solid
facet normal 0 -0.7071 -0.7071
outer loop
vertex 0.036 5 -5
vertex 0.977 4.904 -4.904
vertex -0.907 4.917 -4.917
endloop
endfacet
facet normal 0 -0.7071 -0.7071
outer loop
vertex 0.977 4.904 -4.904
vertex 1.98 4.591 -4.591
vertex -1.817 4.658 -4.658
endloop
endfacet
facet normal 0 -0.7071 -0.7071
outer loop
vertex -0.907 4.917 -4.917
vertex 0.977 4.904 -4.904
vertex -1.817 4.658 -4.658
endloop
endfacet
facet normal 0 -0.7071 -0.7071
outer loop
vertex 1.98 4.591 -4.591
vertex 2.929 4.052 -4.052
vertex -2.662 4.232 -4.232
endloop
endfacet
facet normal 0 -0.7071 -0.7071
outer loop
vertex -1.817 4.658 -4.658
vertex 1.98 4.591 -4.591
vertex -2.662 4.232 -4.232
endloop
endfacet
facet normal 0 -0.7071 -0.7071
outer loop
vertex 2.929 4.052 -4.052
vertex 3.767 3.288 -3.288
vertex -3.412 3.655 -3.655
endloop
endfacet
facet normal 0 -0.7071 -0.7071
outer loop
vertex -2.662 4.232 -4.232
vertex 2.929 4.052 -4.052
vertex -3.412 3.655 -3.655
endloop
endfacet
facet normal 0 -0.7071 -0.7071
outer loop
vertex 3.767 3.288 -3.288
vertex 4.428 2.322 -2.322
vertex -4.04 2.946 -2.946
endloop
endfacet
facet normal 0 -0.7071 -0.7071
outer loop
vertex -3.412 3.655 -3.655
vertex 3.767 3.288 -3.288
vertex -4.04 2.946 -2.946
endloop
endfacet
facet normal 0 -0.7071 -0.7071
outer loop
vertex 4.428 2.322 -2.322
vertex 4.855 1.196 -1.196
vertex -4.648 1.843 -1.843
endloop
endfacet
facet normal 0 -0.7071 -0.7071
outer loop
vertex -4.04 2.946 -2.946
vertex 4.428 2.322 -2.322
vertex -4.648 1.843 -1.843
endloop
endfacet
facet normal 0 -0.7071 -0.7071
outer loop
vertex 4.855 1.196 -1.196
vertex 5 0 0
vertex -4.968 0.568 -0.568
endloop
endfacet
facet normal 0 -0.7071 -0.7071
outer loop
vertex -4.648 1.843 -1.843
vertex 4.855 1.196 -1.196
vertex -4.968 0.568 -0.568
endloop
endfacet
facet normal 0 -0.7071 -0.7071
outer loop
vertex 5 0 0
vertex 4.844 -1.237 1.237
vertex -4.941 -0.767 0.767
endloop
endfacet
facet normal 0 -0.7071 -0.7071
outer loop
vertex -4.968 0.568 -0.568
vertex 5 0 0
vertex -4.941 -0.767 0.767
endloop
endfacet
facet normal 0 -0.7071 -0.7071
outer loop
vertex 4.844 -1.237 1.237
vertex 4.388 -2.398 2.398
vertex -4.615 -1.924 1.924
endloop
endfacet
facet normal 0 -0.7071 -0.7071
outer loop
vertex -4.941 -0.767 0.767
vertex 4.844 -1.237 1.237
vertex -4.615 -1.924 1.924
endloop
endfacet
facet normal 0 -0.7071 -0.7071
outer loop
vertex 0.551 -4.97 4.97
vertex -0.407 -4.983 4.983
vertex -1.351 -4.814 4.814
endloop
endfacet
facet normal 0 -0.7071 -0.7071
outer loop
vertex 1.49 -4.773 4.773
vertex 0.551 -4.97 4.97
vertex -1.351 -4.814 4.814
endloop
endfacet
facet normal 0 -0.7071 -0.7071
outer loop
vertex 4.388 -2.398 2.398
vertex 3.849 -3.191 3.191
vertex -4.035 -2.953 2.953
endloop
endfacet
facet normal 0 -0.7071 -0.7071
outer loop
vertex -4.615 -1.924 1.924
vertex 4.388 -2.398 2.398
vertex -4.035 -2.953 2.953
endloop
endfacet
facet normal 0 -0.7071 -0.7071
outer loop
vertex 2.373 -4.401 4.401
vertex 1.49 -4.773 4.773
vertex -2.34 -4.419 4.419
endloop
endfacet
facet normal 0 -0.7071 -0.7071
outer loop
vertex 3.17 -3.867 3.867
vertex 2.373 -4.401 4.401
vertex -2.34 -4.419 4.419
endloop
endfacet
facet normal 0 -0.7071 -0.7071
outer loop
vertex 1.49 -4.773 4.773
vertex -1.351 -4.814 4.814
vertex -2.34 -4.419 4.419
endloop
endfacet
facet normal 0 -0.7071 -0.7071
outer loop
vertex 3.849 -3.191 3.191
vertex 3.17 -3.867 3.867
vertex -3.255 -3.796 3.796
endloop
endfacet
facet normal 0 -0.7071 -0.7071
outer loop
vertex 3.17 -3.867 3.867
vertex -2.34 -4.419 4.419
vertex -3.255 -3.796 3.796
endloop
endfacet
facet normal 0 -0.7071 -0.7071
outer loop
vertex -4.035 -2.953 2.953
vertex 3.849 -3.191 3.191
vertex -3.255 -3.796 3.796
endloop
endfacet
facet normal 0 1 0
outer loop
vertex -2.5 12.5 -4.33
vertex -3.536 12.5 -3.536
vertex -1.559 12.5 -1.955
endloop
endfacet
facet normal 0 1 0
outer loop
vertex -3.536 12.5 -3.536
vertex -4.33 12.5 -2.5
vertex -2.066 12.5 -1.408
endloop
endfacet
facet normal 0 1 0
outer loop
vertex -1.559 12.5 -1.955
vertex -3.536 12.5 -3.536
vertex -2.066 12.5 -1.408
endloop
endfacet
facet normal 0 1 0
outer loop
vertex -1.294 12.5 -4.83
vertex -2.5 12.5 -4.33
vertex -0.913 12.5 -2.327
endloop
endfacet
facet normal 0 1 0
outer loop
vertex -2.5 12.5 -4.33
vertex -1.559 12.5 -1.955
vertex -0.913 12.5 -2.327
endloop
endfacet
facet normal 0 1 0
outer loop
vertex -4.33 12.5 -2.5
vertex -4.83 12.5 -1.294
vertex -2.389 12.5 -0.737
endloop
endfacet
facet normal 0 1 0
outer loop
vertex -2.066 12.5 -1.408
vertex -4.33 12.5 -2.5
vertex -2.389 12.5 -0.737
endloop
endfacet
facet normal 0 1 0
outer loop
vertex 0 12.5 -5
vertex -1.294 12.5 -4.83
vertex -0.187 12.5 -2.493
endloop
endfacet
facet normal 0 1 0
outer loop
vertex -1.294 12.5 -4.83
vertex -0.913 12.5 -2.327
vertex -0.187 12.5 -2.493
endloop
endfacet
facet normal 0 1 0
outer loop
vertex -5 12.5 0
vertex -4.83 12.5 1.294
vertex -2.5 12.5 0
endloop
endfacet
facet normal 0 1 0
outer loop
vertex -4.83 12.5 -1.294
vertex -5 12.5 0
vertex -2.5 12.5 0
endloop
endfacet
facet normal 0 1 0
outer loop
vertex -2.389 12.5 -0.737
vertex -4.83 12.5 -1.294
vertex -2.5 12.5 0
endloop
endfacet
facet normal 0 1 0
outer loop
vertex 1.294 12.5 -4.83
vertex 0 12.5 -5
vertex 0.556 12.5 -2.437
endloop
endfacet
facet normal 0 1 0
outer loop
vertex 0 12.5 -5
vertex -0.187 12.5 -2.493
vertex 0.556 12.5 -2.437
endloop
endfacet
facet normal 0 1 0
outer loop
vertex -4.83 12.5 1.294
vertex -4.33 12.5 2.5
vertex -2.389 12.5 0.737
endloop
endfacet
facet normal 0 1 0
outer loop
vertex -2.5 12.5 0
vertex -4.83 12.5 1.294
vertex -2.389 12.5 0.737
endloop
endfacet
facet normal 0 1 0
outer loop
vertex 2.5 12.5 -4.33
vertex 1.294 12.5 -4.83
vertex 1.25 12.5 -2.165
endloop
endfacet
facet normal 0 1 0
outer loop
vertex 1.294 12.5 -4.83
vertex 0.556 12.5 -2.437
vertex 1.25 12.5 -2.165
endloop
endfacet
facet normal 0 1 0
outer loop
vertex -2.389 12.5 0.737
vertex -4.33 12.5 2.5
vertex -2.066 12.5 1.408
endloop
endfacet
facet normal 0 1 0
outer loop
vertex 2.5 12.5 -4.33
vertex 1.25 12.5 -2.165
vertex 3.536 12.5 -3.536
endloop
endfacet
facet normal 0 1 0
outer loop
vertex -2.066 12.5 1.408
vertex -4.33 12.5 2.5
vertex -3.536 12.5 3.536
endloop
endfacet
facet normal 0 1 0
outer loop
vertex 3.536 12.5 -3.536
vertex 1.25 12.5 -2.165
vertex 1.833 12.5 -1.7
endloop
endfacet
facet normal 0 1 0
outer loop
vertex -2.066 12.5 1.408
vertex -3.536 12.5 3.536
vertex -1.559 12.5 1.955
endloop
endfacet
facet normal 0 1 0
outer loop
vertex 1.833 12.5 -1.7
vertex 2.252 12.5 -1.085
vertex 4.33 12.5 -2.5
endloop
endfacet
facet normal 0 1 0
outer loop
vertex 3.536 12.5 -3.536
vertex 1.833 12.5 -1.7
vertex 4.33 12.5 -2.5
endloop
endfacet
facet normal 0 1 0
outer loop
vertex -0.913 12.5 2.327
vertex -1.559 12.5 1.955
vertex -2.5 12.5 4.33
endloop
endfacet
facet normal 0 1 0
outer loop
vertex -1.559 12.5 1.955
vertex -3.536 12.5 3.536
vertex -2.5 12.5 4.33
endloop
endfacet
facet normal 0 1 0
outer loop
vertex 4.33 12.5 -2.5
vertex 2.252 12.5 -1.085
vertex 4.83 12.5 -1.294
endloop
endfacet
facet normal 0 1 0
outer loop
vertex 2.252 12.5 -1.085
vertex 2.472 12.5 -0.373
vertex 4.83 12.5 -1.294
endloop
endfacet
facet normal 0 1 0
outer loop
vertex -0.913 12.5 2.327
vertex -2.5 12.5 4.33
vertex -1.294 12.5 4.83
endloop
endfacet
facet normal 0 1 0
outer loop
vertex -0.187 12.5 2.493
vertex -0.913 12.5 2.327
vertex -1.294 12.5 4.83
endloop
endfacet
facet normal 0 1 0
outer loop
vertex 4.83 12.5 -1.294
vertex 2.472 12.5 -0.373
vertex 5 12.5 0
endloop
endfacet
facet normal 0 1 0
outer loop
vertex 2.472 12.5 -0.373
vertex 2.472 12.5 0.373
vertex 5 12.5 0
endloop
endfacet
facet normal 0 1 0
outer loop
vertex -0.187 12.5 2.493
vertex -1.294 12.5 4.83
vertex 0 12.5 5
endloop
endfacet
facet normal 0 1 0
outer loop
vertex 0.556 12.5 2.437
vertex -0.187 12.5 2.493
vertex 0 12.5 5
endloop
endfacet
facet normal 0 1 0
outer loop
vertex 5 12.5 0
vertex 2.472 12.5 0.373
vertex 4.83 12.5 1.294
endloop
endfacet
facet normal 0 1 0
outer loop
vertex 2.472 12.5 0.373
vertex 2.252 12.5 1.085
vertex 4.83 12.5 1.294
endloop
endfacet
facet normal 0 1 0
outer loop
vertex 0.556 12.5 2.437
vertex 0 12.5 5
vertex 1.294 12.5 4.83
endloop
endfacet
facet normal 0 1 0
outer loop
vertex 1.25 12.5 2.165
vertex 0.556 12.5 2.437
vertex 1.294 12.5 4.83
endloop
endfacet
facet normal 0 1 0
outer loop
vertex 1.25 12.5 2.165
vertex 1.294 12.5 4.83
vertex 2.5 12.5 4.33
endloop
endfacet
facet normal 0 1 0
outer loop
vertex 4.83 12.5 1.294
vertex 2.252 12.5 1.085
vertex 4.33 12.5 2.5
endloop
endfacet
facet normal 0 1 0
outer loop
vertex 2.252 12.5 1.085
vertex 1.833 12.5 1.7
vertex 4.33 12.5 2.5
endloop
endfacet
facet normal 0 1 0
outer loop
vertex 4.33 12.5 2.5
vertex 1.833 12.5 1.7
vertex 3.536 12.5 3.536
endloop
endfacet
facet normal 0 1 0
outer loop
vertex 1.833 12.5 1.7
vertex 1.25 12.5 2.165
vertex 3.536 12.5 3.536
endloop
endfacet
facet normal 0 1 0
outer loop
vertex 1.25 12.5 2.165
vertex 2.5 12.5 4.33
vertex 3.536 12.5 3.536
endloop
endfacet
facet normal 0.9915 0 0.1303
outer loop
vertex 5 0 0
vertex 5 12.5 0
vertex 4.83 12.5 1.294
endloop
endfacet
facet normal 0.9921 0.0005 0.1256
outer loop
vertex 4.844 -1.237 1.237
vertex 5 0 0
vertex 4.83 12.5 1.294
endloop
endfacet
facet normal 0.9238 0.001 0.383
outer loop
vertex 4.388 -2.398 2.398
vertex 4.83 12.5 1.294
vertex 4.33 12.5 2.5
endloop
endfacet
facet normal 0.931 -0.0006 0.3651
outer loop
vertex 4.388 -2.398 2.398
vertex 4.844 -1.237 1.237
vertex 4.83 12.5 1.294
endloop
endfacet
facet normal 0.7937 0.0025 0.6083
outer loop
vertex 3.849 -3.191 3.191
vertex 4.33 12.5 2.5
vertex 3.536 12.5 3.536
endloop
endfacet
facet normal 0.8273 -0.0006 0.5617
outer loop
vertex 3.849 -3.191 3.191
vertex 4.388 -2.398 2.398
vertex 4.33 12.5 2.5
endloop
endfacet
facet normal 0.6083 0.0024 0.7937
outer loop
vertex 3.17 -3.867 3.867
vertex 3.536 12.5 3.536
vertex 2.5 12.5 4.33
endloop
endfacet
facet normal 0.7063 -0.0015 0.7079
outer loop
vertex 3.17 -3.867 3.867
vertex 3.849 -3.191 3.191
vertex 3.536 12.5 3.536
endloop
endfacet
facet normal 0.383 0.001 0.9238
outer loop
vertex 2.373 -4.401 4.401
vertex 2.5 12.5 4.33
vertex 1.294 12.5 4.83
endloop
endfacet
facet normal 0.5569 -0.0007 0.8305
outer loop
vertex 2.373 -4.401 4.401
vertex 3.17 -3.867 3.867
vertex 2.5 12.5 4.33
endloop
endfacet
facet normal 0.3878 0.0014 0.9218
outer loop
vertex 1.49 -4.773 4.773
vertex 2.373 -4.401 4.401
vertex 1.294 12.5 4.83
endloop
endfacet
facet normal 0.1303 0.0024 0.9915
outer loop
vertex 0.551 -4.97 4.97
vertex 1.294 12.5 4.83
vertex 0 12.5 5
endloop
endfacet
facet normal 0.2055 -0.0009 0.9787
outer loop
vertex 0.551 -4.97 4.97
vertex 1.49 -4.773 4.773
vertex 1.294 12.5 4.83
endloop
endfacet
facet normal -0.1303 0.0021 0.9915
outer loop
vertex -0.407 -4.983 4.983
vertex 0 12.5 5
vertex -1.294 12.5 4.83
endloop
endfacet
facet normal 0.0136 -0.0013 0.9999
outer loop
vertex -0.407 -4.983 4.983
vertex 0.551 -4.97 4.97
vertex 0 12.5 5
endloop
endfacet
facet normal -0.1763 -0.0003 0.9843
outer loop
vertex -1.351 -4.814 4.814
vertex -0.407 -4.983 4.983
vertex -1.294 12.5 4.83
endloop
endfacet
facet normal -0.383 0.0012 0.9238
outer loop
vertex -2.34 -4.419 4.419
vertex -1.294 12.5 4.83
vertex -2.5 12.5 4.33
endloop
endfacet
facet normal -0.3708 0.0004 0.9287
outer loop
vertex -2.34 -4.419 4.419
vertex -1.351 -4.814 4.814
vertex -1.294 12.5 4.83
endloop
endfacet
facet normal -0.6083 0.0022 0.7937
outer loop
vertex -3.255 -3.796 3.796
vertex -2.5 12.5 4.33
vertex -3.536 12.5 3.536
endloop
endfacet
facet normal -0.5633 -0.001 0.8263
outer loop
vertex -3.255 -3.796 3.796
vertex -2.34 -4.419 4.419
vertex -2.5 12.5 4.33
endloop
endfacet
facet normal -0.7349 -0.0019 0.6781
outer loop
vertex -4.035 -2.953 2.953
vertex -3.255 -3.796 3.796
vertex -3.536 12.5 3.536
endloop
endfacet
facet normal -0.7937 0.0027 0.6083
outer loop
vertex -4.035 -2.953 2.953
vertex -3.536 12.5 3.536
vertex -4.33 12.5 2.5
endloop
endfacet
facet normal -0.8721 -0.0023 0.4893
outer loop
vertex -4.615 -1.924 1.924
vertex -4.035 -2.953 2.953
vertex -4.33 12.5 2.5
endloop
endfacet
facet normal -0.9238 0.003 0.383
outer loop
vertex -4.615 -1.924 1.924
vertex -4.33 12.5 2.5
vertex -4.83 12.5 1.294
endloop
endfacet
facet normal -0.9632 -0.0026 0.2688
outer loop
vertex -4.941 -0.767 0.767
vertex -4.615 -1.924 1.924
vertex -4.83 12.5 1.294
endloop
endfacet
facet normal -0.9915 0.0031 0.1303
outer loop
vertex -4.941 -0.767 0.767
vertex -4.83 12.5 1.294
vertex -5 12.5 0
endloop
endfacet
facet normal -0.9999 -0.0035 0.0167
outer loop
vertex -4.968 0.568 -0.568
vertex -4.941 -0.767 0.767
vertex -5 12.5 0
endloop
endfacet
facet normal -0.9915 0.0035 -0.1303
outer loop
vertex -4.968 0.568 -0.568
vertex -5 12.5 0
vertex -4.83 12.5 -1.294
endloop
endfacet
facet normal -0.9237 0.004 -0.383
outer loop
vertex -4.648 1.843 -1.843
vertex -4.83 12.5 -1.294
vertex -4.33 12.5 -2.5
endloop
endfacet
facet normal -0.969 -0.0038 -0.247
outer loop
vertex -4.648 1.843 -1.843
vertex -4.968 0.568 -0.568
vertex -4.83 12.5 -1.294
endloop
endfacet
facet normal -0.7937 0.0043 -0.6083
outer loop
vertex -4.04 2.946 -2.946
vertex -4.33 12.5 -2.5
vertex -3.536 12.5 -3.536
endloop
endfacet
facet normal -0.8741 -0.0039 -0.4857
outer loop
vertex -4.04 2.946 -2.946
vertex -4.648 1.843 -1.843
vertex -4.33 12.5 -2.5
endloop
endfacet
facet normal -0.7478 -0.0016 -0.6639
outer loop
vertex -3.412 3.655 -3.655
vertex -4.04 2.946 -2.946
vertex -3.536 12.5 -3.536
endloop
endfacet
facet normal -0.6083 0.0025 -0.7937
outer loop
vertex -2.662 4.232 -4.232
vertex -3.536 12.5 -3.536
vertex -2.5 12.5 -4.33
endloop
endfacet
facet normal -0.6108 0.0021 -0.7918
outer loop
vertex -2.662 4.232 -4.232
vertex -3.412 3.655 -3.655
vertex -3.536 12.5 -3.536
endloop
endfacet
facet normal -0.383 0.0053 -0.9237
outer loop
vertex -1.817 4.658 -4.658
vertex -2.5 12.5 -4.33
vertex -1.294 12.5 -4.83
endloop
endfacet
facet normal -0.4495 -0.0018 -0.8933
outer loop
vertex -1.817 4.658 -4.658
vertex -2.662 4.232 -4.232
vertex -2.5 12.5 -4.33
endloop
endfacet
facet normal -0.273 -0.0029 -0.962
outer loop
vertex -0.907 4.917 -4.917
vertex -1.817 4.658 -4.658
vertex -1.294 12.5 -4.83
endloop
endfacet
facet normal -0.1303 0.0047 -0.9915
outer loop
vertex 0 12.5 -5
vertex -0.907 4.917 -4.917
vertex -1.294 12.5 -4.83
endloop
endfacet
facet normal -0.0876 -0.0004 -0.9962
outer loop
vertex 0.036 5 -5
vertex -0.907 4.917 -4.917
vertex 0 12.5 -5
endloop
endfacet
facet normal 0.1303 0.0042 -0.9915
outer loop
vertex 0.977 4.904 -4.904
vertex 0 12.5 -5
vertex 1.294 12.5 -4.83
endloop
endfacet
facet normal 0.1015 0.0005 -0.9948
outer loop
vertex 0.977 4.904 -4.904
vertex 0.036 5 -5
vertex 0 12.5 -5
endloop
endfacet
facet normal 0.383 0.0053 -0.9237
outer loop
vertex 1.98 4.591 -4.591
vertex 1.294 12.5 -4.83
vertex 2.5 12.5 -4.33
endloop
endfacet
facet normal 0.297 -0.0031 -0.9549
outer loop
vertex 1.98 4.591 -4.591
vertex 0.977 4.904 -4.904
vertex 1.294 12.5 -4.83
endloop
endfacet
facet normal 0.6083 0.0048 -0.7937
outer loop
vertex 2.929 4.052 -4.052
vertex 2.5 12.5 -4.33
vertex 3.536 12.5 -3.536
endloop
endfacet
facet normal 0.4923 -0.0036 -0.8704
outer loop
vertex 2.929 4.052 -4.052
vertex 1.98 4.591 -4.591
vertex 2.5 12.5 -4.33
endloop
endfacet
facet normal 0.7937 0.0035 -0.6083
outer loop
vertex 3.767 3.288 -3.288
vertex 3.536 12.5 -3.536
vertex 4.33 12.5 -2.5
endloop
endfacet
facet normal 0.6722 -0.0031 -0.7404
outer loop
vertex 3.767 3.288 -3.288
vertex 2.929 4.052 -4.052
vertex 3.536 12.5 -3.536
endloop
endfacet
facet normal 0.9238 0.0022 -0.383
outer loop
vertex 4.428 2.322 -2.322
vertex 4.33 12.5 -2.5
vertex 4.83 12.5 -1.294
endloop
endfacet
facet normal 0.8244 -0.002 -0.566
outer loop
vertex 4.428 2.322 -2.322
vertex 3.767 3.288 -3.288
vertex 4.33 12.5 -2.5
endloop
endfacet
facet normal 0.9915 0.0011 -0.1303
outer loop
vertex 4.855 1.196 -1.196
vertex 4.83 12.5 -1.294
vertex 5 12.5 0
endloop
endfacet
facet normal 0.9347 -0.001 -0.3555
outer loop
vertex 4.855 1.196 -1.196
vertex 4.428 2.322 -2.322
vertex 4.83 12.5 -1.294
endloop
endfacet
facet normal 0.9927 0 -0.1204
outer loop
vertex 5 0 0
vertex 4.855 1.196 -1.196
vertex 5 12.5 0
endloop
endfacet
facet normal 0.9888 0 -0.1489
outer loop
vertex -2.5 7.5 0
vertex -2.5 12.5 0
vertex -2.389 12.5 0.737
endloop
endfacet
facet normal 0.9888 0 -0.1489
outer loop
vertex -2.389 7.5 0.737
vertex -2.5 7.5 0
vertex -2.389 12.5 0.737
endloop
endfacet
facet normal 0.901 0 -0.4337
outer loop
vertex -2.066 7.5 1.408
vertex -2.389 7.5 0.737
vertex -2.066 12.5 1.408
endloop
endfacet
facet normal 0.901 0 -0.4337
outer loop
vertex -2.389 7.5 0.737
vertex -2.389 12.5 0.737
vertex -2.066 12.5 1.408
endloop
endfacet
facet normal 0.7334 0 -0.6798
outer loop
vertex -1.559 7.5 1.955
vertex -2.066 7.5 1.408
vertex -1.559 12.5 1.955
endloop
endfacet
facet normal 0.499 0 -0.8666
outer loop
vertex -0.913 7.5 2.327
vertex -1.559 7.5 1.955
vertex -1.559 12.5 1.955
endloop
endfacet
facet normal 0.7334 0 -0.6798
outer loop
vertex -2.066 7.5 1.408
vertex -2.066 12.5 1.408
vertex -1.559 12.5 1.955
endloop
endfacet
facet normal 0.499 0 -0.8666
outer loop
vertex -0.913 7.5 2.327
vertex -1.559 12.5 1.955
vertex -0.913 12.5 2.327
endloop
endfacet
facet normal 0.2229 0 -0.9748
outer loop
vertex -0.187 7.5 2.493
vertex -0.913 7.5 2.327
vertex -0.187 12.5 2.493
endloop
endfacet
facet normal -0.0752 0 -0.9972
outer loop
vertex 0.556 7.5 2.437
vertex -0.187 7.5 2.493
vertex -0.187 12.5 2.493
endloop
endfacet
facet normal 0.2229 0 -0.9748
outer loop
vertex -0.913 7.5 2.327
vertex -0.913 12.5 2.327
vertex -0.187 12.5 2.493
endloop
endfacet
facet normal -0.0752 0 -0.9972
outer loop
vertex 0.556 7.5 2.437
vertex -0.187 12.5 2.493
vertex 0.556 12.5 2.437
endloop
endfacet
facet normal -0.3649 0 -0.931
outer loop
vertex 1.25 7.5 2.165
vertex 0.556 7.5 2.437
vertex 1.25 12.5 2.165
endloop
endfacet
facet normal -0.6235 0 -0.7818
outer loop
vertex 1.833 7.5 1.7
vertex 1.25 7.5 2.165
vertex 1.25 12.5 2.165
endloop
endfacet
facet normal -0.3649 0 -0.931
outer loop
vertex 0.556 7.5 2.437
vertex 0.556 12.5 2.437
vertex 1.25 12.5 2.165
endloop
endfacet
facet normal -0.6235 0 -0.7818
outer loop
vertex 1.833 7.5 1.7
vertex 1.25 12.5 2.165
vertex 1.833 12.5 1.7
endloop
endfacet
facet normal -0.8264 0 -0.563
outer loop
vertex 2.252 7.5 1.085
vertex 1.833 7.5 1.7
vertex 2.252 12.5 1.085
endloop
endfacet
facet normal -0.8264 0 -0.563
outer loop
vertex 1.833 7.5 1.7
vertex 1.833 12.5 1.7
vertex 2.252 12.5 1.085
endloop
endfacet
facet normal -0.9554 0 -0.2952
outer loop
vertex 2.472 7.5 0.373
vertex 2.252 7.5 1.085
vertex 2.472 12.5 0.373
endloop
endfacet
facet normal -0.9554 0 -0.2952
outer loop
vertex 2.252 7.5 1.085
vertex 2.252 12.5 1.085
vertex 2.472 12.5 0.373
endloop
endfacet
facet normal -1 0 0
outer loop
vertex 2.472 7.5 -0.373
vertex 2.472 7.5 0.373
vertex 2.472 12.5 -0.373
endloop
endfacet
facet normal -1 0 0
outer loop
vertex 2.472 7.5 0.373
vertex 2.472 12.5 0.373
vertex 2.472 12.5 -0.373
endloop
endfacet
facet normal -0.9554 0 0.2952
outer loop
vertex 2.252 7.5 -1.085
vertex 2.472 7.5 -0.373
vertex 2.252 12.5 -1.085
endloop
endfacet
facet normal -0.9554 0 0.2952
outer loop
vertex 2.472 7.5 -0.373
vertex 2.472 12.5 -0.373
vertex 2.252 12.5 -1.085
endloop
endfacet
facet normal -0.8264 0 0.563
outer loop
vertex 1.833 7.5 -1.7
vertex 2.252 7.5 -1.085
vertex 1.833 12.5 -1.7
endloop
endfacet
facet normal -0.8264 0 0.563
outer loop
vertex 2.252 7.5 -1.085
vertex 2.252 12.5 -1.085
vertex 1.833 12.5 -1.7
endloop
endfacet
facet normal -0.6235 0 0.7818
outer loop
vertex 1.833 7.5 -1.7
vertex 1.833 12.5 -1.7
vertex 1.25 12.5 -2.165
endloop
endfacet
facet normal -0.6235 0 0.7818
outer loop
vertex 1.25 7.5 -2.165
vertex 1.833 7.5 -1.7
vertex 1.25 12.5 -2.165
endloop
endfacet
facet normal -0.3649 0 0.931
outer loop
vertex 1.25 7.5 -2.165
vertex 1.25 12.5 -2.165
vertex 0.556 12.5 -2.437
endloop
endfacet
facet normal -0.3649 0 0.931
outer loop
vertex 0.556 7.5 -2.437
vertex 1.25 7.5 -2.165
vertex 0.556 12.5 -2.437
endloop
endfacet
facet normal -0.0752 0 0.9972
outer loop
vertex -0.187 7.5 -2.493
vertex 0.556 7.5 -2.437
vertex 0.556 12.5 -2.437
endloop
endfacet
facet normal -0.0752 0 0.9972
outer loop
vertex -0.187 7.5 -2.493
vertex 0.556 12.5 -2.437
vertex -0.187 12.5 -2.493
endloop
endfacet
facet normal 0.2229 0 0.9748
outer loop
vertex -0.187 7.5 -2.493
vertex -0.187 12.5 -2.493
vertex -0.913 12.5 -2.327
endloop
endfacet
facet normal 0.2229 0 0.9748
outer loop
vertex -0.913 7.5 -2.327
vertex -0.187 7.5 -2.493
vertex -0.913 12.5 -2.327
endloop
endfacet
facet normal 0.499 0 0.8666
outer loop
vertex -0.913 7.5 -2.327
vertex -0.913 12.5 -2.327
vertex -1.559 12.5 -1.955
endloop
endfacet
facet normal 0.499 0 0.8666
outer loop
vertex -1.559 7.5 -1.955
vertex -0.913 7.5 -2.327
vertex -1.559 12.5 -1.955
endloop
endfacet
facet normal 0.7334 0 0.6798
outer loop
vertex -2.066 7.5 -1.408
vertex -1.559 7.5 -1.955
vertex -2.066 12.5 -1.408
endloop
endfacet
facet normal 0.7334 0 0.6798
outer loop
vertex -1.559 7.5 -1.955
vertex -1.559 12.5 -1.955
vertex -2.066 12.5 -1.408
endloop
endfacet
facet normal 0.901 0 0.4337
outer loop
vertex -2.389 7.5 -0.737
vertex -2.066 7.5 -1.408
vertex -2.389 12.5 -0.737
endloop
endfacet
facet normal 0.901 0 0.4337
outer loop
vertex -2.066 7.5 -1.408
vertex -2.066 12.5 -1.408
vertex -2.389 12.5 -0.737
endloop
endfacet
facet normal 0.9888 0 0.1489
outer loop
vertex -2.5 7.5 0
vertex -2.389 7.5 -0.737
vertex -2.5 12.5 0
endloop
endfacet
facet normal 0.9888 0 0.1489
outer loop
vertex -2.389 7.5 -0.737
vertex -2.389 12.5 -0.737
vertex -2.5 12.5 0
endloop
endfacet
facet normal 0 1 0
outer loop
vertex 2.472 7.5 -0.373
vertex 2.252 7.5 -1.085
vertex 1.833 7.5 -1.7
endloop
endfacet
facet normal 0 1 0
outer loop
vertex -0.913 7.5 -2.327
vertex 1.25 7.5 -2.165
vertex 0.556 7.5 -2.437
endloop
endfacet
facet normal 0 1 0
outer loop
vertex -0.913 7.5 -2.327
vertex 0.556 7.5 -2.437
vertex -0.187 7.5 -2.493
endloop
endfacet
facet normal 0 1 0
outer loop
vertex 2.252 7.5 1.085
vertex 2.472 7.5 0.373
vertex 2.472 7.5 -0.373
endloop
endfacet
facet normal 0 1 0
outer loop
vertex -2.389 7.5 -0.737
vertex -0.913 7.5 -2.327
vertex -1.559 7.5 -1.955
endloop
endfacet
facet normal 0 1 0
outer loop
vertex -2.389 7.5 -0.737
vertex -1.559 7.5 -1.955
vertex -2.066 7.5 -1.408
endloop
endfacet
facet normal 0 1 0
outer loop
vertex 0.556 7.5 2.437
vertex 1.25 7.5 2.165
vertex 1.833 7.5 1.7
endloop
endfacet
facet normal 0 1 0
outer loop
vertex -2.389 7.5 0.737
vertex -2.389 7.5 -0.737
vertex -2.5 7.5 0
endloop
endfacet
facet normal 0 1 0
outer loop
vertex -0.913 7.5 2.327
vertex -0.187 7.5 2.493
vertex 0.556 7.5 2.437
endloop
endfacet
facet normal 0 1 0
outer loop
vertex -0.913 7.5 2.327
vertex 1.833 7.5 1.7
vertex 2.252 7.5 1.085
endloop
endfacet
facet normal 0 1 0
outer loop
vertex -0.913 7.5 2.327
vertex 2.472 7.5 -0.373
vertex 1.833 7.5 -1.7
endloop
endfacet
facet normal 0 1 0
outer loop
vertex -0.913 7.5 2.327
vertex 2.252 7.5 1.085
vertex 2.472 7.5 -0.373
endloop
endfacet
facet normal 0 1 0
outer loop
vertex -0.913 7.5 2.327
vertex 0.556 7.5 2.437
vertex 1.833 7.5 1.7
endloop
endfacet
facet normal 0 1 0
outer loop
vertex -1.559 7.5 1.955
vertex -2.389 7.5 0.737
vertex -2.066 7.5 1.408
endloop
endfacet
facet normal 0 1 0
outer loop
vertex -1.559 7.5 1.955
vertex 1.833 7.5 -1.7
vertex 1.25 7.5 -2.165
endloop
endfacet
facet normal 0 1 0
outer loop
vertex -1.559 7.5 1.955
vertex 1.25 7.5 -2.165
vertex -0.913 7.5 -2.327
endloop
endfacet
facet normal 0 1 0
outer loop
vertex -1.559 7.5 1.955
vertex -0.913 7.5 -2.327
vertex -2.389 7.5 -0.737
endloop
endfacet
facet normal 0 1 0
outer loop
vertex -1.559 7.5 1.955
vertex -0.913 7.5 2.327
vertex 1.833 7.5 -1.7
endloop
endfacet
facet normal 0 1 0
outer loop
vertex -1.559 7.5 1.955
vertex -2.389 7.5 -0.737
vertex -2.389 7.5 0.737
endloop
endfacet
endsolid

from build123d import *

# Parameters (mm, degrees)
F0_R     = 5
F1_DEPTH = 12.5
F3_W     = 50
F3_H     = 50
F4_DEPTH = 25
F5_R     = 2.5
F6_DEPTH = 5


with BuildPart() as f1:
    # F0 (on Front) → F1 (new body, symmetric)
    with BuildSketch(Plane.XZ):
        Circle(F0_R)
    extrude(amount=F1_DEPTH, both=True)

    # F3 (on face) → F4 (cut)
    with BuildSketch(Plane(origin=(0, 0, 0), x_dir=(-1, 0, 0), z_dir=(0, 0.707107, 0.707107))):
        Rectangle(F3_W, F3_H)
    extrude(amount=-F4_DEPTH, mode=Mode.SUBTRACT)

    # F5 (on face) → F6 (cut)
    with BuildSketch(Plane(origin=(0, 12.5, 0), x_dir=(-1, 0, 0), z_dir=(0, 1, 0))):
        Circle(F5_R)
    extrude(amount=-F6_DEPTH, mode=Mode.SUBTRACT)


solid = f1.part
